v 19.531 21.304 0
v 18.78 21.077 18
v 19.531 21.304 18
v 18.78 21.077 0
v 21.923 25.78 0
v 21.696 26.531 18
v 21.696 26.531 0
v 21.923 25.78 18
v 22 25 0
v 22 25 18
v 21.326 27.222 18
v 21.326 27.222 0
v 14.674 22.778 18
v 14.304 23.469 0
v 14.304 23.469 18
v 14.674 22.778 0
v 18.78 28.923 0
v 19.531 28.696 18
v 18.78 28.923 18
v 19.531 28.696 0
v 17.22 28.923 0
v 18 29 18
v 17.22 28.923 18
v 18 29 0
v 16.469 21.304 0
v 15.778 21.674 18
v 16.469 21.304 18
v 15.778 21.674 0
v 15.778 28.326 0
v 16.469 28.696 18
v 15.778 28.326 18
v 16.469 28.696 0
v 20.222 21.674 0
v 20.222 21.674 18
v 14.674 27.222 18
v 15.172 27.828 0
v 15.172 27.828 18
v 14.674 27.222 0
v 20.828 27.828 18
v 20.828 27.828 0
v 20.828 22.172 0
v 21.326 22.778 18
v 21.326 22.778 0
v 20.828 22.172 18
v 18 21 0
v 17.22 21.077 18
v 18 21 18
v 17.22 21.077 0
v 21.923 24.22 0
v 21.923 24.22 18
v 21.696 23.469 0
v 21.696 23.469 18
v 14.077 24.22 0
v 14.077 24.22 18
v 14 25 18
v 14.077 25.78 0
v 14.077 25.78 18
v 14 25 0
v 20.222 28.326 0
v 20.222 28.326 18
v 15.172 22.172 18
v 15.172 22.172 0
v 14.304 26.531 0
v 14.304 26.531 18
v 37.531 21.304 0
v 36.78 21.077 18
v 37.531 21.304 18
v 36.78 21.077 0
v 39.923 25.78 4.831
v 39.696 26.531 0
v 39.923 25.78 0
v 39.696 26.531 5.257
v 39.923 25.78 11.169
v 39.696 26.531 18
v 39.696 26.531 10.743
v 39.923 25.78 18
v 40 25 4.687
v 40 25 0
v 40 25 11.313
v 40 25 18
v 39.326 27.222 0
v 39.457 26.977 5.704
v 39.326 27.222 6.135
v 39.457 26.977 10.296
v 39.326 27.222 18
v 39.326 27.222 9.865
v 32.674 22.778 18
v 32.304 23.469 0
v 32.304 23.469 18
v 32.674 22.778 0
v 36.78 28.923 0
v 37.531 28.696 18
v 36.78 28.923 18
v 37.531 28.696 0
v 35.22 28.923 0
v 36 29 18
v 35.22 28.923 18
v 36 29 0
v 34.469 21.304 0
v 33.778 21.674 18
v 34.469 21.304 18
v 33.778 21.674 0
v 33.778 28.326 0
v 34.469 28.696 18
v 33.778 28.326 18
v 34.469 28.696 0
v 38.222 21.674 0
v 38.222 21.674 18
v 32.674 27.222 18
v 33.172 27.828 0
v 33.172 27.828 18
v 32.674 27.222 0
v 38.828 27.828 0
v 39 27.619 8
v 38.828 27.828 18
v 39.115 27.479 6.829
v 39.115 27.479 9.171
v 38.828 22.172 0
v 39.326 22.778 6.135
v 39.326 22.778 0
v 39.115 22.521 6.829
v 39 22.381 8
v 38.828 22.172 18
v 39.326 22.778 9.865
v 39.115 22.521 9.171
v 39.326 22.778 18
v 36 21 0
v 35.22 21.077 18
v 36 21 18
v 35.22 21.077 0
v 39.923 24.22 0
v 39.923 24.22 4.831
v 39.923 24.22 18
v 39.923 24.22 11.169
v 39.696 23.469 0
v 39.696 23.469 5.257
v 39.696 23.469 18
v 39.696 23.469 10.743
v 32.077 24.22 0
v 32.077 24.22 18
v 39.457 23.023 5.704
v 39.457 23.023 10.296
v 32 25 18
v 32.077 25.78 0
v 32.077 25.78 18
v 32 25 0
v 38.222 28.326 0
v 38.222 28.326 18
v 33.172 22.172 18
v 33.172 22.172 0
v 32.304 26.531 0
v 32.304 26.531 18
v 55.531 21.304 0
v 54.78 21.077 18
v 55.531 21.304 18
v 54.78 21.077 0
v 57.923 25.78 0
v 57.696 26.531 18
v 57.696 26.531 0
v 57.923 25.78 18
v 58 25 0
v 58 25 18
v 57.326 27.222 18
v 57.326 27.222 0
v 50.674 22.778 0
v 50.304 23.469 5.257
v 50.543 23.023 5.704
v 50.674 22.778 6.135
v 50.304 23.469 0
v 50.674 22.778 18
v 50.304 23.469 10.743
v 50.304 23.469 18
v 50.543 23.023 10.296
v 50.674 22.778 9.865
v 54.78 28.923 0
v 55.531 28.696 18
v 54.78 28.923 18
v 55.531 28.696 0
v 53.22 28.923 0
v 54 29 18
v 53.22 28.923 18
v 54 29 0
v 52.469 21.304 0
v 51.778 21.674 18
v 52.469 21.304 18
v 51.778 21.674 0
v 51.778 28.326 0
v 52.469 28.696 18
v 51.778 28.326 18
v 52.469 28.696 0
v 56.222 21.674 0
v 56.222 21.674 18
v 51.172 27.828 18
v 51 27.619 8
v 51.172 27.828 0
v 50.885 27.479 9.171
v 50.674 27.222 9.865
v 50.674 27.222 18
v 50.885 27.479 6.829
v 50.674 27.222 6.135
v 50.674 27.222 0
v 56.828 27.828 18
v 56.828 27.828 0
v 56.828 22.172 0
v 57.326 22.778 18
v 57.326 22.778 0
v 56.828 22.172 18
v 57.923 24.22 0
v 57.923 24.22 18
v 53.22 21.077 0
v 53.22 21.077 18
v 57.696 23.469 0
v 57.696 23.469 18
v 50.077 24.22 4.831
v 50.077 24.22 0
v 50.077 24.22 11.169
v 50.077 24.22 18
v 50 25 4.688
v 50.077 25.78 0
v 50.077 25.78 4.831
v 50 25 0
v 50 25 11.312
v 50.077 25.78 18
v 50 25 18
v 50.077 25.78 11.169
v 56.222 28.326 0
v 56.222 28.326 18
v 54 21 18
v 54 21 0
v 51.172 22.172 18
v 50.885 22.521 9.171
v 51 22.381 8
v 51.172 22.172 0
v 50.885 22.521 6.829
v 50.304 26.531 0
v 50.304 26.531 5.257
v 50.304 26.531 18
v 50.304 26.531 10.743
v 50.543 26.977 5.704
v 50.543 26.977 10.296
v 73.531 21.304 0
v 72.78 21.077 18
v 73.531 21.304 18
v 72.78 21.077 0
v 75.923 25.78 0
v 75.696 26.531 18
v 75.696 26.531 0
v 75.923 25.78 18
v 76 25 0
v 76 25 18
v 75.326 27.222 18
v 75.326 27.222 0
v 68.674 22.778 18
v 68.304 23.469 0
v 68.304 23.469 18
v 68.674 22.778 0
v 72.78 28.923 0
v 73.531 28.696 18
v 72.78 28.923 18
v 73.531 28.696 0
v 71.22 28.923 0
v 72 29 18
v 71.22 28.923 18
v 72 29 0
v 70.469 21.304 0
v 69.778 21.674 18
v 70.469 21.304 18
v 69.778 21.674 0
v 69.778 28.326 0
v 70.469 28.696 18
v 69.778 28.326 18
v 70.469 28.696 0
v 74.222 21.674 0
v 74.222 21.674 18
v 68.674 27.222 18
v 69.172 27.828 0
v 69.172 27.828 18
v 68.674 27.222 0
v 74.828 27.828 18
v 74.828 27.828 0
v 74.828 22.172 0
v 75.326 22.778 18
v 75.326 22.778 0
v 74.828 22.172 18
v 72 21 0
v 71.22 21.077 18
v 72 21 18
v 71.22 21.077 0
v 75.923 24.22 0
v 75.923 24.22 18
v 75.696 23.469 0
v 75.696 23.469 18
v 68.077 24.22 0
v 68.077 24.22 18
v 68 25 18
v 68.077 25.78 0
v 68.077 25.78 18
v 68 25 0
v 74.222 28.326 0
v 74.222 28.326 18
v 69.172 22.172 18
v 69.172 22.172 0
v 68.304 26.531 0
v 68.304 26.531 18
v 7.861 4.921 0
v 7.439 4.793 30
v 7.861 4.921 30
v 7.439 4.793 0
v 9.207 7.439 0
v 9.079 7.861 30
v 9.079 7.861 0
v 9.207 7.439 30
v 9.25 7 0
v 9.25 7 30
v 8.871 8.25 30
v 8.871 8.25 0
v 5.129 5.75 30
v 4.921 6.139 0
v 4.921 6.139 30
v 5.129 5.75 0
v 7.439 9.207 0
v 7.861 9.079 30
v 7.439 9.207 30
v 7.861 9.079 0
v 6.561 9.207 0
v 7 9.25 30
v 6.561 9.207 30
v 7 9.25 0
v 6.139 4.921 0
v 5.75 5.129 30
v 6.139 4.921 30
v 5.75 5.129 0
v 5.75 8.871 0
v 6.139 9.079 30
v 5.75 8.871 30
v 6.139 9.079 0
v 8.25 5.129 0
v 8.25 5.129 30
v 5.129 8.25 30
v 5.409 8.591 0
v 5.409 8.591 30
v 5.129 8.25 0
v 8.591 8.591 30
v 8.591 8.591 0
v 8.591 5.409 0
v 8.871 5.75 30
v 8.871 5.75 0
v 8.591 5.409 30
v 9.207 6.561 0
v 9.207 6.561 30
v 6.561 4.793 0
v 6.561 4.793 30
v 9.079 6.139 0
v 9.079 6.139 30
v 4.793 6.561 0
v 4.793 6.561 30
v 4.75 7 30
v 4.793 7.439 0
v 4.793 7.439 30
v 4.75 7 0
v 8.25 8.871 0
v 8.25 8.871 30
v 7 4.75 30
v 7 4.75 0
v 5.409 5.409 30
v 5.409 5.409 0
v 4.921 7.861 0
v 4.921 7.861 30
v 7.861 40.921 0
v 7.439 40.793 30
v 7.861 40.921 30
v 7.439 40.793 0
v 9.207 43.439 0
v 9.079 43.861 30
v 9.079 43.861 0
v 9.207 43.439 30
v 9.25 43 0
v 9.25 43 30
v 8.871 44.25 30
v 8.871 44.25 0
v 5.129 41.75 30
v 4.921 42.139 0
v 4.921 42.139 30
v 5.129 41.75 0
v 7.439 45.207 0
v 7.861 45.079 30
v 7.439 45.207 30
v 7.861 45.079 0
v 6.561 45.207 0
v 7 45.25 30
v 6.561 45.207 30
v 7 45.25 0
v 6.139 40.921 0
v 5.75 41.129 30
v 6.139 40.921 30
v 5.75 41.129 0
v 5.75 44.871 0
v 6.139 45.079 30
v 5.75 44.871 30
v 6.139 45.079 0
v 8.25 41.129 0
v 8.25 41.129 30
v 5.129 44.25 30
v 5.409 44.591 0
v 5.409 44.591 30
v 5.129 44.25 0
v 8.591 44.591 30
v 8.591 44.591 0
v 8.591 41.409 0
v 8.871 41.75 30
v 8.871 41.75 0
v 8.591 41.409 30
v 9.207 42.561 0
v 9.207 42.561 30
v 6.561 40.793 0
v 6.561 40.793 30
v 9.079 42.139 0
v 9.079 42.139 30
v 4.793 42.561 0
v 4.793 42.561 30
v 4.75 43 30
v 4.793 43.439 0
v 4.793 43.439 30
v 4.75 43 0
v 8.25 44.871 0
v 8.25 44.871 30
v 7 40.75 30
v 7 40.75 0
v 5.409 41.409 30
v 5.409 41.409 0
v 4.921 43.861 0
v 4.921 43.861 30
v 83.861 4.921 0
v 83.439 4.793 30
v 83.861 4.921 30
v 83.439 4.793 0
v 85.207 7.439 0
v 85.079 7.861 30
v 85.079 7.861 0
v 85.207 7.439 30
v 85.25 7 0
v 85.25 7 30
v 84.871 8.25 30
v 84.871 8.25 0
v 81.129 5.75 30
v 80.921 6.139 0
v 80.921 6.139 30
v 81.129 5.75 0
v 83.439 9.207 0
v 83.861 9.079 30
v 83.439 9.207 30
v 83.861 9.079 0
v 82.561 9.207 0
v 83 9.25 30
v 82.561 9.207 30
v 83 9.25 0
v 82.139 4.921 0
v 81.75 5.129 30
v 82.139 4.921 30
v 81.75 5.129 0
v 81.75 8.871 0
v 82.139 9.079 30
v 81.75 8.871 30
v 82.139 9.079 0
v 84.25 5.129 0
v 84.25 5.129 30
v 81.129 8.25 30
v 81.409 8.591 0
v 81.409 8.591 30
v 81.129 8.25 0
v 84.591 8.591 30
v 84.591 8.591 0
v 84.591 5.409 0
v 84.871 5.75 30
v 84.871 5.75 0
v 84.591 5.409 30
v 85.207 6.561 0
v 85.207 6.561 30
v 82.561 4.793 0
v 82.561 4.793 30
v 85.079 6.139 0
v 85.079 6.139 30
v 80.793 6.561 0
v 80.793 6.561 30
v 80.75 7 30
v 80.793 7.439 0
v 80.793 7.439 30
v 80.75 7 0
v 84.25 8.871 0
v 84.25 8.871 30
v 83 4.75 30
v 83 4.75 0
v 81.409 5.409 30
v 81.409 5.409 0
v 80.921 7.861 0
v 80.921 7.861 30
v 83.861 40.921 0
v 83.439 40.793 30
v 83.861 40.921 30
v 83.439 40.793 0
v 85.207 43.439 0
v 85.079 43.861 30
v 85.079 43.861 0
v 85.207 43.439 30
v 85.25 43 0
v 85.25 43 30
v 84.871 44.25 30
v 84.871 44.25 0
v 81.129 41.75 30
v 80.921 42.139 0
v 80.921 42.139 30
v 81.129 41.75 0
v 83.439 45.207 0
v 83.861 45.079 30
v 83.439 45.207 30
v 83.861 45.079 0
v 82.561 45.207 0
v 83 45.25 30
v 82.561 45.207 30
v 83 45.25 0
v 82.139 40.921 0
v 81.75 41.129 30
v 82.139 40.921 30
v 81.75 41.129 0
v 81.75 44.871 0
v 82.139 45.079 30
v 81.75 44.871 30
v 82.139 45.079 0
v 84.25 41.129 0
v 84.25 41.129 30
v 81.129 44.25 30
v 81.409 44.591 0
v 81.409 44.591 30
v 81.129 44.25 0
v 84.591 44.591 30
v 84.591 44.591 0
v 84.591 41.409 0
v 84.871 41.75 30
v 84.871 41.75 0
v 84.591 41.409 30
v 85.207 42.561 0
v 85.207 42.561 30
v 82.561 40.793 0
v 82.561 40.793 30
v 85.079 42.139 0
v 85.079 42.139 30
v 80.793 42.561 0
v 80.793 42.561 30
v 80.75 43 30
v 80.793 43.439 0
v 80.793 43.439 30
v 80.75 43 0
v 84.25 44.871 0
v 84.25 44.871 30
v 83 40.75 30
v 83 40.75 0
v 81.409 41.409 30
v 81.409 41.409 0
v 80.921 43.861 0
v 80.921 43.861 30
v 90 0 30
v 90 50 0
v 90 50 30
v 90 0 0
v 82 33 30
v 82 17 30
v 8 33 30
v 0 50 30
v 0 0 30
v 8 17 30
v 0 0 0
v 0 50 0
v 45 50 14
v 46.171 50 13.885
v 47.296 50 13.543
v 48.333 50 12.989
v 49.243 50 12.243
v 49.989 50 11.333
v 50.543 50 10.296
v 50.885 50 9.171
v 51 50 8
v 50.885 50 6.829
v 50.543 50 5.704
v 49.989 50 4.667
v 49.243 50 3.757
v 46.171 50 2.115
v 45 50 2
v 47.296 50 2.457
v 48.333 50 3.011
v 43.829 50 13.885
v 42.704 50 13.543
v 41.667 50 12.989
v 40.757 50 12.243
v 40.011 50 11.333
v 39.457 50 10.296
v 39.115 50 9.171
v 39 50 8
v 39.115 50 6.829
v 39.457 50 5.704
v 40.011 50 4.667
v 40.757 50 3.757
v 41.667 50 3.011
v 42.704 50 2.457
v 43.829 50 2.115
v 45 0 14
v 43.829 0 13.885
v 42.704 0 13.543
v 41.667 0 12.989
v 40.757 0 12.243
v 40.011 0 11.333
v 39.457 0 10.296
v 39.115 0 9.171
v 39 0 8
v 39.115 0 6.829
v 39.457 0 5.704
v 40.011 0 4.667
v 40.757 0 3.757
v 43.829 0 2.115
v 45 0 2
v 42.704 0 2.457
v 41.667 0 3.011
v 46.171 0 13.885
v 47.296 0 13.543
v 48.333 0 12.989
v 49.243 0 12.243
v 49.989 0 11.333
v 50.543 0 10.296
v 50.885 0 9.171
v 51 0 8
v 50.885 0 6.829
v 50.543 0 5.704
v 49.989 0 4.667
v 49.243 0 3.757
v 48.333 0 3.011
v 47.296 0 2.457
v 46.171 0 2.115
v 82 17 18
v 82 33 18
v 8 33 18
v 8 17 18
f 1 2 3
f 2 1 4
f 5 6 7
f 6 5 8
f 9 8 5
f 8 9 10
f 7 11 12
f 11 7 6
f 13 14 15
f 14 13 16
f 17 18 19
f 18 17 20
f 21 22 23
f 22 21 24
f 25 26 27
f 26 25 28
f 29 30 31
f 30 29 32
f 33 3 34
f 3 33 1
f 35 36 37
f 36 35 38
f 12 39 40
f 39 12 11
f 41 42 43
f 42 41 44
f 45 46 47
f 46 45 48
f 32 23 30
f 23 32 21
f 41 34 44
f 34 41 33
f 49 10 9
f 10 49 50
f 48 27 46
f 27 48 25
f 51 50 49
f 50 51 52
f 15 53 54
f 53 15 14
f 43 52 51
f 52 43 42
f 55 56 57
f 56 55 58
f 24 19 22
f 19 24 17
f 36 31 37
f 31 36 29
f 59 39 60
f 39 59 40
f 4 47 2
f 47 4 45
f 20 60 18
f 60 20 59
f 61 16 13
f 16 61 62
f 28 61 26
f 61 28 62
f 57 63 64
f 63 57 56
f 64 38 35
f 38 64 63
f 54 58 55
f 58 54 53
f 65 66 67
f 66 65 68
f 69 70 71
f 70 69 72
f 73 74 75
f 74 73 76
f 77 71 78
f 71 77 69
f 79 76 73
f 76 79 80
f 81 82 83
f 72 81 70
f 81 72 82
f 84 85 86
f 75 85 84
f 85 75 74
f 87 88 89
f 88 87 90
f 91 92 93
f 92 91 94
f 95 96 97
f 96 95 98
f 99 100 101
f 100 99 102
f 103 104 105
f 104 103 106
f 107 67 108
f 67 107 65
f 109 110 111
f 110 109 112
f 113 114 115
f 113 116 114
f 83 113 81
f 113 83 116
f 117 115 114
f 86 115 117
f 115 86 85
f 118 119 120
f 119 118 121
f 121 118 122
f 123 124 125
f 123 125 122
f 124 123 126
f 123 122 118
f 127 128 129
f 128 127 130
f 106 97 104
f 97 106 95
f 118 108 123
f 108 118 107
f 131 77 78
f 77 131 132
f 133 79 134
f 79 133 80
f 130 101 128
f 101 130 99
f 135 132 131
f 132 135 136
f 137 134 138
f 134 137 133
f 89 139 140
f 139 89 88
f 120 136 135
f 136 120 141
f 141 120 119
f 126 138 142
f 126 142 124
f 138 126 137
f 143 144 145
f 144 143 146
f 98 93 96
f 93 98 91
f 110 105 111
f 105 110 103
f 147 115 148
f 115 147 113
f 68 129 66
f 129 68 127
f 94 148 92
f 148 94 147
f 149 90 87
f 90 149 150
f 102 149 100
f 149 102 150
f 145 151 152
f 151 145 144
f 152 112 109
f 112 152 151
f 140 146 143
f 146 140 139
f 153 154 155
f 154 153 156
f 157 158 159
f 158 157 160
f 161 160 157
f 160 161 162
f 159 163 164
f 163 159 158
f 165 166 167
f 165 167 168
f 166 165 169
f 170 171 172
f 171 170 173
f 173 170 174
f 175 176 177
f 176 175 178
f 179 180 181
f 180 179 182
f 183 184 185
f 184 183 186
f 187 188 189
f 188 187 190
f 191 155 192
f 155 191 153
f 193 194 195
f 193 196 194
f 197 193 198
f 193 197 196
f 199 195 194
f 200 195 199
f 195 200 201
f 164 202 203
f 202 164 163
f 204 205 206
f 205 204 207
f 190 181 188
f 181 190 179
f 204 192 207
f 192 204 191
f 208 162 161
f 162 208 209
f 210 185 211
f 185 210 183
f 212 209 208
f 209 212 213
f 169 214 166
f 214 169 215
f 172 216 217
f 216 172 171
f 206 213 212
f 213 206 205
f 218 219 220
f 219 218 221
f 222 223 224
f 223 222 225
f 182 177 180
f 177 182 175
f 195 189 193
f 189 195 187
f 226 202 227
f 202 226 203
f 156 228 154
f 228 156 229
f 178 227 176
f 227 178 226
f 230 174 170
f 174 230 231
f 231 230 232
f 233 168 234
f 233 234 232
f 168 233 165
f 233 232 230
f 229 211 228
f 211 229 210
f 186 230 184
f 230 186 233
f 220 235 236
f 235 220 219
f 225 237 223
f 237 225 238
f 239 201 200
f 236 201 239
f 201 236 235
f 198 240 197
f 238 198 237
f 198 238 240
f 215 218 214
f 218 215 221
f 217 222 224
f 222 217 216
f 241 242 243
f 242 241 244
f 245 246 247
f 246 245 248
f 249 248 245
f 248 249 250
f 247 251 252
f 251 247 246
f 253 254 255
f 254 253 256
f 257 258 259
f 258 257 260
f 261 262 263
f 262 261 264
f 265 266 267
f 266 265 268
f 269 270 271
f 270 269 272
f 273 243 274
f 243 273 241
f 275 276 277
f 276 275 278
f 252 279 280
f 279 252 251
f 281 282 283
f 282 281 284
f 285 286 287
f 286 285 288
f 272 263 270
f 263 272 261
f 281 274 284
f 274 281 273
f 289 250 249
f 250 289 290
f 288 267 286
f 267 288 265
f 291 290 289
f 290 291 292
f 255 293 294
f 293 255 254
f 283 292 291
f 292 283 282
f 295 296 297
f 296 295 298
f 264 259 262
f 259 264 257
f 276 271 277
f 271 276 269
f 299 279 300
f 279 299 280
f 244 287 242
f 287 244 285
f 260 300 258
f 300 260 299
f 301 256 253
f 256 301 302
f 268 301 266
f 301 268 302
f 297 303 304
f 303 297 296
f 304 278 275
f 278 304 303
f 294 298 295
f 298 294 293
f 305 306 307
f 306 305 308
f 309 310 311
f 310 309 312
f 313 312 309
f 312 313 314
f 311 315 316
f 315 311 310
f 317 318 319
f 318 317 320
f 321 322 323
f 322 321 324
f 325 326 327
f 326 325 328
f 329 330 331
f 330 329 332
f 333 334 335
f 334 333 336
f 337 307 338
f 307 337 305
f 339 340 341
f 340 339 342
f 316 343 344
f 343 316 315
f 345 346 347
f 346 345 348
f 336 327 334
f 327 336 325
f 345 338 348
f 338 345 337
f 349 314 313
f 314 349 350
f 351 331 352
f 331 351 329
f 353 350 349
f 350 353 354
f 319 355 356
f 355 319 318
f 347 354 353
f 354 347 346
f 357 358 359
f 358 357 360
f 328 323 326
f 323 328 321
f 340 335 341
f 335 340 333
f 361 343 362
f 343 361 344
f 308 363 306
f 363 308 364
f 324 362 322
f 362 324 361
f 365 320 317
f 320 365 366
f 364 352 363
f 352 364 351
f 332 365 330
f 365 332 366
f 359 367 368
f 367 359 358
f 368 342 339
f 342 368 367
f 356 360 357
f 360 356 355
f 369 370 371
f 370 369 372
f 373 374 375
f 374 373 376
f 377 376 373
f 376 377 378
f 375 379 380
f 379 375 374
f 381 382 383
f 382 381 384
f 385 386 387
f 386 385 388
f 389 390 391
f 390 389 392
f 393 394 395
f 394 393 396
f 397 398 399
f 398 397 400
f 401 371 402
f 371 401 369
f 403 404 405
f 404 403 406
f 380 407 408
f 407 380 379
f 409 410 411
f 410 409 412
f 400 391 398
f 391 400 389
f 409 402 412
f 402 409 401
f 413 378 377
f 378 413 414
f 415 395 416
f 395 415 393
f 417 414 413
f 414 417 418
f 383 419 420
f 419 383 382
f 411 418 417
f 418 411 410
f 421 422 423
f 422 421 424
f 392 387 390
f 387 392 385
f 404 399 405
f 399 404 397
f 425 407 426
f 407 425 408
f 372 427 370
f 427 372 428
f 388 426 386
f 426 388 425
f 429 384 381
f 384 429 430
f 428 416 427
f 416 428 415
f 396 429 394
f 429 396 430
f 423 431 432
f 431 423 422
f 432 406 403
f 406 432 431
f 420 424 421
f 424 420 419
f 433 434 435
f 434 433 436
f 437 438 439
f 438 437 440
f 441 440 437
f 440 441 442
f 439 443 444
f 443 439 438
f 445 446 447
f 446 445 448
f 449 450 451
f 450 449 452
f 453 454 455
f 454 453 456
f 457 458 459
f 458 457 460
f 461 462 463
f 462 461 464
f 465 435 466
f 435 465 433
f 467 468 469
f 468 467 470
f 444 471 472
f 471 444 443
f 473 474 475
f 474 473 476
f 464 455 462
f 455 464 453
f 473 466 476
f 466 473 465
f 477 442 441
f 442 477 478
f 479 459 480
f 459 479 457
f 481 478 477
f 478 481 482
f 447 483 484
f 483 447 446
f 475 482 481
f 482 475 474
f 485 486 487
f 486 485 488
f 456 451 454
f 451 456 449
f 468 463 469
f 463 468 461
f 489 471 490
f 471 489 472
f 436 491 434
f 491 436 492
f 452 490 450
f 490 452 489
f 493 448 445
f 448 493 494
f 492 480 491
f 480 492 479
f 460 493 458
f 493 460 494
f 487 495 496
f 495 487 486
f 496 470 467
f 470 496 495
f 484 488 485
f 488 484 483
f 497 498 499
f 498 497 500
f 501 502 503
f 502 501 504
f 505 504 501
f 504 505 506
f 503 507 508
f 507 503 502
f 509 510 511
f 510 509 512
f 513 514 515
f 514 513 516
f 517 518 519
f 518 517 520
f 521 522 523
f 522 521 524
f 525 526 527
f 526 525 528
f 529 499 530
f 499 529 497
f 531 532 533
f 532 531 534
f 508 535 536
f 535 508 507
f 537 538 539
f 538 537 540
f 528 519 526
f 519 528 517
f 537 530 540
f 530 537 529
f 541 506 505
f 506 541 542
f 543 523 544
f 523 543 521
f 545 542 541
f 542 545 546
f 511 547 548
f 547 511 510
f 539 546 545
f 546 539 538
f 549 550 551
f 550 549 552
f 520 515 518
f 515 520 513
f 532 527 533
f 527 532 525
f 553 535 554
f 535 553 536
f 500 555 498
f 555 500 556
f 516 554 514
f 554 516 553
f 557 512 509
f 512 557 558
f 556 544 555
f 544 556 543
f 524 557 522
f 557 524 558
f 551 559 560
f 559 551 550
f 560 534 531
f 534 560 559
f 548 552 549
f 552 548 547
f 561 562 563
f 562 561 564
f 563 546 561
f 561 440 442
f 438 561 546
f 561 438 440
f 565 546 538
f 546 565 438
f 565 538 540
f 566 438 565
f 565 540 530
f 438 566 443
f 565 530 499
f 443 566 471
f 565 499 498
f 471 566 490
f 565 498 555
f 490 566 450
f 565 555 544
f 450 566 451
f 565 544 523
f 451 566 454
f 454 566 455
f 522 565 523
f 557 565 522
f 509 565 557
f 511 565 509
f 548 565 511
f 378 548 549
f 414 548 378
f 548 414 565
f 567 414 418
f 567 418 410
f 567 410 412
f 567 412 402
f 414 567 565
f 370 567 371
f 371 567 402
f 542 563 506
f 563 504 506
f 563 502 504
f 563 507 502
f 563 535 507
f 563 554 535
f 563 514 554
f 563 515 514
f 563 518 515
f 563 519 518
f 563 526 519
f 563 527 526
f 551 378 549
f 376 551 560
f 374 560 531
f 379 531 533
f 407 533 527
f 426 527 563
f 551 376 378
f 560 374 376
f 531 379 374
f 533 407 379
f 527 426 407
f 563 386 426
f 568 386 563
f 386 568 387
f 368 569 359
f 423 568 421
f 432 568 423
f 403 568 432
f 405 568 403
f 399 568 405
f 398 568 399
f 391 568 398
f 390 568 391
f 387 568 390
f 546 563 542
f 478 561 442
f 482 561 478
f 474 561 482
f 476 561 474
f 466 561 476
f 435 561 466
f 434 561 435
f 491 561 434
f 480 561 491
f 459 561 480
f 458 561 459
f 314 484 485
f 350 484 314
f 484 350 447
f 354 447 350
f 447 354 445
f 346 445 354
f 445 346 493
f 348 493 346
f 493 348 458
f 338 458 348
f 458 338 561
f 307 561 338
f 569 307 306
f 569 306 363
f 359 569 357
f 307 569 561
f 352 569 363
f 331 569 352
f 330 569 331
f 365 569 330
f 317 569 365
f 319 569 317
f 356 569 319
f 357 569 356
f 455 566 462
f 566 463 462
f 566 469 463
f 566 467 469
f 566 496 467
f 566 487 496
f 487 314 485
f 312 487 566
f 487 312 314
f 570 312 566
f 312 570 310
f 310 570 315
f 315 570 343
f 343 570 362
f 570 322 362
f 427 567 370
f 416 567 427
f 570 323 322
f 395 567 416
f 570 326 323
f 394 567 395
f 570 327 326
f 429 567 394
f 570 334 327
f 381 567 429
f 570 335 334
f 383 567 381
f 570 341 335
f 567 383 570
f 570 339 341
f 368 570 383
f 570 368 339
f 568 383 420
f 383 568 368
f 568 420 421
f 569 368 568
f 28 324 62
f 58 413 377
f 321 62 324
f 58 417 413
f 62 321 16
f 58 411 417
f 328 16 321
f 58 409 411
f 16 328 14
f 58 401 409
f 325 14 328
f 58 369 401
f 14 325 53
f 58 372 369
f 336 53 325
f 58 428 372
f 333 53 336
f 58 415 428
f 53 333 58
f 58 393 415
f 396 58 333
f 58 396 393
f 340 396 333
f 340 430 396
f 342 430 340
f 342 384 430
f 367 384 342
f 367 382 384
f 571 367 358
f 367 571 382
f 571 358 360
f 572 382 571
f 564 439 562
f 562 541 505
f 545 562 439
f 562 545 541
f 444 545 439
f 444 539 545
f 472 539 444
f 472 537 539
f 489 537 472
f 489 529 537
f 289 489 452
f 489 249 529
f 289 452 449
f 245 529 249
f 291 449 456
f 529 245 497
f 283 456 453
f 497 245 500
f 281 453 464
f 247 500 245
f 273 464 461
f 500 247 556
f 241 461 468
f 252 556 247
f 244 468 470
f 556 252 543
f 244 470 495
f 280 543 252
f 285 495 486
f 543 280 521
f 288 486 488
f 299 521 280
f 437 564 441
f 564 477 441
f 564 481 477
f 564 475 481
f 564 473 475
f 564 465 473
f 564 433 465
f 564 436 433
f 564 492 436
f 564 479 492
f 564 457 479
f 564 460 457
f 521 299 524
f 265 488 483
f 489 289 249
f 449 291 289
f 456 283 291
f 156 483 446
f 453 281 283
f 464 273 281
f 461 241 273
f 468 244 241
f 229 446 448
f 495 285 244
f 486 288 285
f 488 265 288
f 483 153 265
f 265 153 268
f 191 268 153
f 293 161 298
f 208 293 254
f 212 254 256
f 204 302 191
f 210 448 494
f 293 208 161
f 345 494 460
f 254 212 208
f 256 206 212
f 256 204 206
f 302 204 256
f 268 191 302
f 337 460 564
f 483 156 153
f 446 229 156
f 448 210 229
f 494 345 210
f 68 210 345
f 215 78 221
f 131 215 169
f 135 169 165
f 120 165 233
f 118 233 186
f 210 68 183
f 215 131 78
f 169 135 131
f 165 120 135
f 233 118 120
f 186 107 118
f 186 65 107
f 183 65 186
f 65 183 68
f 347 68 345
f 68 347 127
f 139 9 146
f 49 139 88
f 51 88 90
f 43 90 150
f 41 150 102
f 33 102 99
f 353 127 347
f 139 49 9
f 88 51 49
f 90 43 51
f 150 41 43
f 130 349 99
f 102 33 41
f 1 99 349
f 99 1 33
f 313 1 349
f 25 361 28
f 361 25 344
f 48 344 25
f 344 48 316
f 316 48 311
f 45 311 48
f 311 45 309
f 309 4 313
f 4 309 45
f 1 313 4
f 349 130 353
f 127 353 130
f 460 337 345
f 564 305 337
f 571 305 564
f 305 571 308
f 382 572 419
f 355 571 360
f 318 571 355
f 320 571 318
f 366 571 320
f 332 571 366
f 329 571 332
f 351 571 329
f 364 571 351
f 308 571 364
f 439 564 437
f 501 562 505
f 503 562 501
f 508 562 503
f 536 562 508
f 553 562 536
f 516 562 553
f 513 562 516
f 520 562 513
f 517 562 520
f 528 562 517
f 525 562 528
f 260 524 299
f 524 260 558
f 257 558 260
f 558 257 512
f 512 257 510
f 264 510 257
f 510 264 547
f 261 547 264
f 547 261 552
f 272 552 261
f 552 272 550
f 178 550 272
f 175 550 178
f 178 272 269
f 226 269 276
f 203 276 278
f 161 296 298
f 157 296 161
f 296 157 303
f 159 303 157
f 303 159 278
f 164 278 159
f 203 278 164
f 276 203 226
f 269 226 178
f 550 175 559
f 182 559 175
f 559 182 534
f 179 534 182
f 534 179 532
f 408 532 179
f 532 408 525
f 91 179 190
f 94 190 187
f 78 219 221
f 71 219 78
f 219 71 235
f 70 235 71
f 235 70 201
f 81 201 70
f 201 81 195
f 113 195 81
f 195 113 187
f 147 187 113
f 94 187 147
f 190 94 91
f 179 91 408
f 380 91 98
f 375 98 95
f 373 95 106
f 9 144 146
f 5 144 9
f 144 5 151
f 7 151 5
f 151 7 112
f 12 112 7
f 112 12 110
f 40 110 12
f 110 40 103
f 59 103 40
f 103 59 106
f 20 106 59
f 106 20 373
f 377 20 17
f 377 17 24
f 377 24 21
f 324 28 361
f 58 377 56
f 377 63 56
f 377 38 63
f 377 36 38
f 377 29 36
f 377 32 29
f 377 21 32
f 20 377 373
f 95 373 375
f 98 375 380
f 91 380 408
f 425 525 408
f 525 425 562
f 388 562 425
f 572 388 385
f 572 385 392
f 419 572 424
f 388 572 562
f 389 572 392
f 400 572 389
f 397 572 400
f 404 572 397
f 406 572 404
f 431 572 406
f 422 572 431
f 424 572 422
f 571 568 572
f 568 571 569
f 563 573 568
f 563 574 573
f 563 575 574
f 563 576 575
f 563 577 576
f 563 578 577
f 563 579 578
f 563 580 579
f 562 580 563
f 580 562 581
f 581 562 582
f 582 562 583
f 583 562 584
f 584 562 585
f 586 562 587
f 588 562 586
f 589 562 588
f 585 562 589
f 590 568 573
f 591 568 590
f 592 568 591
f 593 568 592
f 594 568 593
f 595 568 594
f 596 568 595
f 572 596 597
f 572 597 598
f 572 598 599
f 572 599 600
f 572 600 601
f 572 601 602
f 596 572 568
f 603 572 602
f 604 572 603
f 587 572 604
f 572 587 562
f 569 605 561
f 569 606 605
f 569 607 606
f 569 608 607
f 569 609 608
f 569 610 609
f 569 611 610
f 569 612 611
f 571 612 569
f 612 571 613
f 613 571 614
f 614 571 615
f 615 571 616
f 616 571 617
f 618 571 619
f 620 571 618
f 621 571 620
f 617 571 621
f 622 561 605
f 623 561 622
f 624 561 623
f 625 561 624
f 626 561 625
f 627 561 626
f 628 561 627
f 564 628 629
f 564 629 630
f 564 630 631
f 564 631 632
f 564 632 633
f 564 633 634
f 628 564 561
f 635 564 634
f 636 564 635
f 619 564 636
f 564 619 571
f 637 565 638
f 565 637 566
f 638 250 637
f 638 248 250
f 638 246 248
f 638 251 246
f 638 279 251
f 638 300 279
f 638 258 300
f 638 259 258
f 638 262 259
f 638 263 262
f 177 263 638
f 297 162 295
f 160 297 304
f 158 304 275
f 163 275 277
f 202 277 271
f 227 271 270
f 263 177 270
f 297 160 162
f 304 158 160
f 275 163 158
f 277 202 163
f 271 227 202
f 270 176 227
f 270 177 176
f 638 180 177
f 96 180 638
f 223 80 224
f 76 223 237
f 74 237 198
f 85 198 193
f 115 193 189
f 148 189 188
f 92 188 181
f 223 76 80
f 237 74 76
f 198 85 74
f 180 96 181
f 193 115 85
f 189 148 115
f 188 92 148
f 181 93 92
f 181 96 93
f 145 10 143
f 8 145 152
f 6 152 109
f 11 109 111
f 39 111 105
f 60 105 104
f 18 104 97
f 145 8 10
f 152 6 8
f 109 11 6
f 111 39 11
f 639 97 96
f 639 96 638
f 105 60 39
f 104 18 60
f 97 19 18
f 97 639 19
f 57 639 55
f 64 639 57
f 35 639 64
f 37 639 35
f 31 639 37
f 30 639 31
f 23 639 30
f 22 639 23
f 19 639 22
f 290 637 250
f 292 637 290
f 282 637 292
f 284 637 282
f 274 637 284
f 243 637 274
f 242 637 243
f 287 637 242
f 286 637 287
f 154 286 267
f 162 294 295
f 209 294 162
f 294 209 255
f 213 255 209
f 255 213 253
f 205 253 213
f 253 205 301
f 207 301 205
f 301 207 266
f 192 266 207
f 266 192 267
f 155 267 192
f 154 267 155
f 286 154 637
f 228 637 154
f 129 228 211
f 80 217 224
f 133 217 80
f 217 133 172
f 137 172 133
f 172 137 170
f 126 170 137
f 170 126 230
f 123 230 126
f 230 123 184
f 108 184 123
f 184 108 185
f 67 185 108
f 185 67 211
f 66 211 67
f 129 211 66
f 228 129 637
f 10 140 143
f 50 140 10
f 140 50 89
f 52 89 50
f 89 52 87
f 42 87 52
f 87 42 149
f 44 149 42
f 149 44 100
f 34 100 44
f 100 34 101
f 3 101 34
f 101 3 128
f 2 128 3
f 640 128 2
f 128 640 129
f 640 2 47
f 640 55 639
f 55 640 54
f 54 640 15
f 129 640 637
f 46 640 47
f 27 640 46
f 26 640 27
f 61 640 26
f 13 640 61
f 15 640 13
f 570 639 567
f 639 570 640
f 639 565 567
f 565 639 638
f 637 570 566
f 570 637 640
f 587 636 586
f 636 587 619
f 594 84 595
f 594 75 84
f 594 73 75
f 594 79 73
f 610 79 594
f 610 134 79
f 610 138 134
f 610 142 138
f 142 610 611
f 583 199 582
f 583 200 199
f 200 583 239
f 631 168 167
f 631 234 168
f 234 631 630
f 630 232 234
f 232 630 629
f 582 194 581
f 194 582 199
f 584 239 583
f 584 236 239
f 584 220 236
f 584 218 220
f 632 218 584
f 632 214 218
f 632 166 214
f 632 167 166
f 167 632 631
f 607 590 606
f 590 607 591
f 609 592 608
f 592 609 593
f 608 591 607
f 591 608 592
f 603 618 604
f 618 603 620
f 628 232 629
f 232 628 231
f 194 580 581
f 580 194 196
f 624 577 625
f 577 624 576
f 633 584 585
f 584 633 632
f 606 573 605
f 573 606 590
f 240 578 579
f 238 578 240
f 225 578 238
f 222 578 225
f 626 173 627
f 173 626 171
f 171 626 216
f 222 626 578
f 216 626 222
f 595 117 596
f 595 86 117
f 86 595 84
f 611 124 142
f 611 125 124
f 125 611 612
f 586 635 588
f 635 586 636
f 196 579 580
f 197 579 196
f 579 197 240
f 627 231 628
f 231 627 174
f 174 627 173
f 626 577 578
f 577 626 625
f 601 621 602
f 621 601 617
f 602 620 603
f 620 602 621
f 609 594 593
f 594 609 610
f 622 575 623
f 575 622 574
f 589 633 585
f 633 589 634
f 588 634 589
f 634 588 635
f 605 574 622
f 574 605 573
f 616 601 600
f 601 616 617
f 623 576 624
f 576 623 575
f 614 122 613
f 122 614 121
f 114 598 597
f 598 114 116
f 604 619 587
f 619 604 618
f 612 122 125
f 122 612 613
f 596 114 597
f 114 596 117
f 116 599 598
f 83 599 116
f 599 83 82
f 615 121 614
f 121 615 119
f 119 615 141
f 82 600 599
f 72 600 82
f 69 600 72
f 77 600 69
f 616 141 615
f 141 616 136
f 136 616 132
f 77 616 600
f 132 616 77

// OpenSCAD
$fn = 32;

// ----------------------------------------------------------------------
// Manifold block: side_outlet manifold
// ----------------------------------------------------------------------

// --- parameters (mm) ---
block_l = 90;             // block length, X
block_w = 50;             // block width, Y
block_h = 30;             // block height, Z
port_d = 8;               // port bore diameter
port_pitch = 18;          // port pitch along X
gallery_d = 16;           // top gallery width, Y
gallery_depth = 12;       // gallery pocket depth
wall_p = 8;               // gallery end wall thickness, X
mnt_d = 4.5;              // mounting hole diameter
mnt_in = 7;               // mounting hole inset from the edges
out_d = 12;               // outlet bore diameter
out_z = 8;                // outlet axis height

n_ports = 4;  // ports in the row
port_x0 = (block_l - (n_ports - 1) * port_pitch) / 2;  // first port X

difference() {
  cube([block_l, block_w, block_h]);
  for (i = [0 : n_ports - 1])
    translate([port_x0 + i * port_pitch, block_w / 2, -1])
      cylinder(h = block_h + 2, d = port_d);
  translate([wall_p, block_w / 2 - gallery_d / 2, block_h - gallery_depth])
    cube([block_l - 2 * wall_p, gallery_d, gallery_depth + 1]);
  for (cx = [mnt_in, block_l - mnt_in])
    for (cy = [mnt_in, block_w - mnt_in])
      translate([cx, cy, -1]) cylinder(h = block_h + 2, d = mnt_d);
  translate([block_l / 2, -1, out_z]) rotate([-90, 0, 0])
    cylinder(h = block_w + 2, d = out_d);
}
